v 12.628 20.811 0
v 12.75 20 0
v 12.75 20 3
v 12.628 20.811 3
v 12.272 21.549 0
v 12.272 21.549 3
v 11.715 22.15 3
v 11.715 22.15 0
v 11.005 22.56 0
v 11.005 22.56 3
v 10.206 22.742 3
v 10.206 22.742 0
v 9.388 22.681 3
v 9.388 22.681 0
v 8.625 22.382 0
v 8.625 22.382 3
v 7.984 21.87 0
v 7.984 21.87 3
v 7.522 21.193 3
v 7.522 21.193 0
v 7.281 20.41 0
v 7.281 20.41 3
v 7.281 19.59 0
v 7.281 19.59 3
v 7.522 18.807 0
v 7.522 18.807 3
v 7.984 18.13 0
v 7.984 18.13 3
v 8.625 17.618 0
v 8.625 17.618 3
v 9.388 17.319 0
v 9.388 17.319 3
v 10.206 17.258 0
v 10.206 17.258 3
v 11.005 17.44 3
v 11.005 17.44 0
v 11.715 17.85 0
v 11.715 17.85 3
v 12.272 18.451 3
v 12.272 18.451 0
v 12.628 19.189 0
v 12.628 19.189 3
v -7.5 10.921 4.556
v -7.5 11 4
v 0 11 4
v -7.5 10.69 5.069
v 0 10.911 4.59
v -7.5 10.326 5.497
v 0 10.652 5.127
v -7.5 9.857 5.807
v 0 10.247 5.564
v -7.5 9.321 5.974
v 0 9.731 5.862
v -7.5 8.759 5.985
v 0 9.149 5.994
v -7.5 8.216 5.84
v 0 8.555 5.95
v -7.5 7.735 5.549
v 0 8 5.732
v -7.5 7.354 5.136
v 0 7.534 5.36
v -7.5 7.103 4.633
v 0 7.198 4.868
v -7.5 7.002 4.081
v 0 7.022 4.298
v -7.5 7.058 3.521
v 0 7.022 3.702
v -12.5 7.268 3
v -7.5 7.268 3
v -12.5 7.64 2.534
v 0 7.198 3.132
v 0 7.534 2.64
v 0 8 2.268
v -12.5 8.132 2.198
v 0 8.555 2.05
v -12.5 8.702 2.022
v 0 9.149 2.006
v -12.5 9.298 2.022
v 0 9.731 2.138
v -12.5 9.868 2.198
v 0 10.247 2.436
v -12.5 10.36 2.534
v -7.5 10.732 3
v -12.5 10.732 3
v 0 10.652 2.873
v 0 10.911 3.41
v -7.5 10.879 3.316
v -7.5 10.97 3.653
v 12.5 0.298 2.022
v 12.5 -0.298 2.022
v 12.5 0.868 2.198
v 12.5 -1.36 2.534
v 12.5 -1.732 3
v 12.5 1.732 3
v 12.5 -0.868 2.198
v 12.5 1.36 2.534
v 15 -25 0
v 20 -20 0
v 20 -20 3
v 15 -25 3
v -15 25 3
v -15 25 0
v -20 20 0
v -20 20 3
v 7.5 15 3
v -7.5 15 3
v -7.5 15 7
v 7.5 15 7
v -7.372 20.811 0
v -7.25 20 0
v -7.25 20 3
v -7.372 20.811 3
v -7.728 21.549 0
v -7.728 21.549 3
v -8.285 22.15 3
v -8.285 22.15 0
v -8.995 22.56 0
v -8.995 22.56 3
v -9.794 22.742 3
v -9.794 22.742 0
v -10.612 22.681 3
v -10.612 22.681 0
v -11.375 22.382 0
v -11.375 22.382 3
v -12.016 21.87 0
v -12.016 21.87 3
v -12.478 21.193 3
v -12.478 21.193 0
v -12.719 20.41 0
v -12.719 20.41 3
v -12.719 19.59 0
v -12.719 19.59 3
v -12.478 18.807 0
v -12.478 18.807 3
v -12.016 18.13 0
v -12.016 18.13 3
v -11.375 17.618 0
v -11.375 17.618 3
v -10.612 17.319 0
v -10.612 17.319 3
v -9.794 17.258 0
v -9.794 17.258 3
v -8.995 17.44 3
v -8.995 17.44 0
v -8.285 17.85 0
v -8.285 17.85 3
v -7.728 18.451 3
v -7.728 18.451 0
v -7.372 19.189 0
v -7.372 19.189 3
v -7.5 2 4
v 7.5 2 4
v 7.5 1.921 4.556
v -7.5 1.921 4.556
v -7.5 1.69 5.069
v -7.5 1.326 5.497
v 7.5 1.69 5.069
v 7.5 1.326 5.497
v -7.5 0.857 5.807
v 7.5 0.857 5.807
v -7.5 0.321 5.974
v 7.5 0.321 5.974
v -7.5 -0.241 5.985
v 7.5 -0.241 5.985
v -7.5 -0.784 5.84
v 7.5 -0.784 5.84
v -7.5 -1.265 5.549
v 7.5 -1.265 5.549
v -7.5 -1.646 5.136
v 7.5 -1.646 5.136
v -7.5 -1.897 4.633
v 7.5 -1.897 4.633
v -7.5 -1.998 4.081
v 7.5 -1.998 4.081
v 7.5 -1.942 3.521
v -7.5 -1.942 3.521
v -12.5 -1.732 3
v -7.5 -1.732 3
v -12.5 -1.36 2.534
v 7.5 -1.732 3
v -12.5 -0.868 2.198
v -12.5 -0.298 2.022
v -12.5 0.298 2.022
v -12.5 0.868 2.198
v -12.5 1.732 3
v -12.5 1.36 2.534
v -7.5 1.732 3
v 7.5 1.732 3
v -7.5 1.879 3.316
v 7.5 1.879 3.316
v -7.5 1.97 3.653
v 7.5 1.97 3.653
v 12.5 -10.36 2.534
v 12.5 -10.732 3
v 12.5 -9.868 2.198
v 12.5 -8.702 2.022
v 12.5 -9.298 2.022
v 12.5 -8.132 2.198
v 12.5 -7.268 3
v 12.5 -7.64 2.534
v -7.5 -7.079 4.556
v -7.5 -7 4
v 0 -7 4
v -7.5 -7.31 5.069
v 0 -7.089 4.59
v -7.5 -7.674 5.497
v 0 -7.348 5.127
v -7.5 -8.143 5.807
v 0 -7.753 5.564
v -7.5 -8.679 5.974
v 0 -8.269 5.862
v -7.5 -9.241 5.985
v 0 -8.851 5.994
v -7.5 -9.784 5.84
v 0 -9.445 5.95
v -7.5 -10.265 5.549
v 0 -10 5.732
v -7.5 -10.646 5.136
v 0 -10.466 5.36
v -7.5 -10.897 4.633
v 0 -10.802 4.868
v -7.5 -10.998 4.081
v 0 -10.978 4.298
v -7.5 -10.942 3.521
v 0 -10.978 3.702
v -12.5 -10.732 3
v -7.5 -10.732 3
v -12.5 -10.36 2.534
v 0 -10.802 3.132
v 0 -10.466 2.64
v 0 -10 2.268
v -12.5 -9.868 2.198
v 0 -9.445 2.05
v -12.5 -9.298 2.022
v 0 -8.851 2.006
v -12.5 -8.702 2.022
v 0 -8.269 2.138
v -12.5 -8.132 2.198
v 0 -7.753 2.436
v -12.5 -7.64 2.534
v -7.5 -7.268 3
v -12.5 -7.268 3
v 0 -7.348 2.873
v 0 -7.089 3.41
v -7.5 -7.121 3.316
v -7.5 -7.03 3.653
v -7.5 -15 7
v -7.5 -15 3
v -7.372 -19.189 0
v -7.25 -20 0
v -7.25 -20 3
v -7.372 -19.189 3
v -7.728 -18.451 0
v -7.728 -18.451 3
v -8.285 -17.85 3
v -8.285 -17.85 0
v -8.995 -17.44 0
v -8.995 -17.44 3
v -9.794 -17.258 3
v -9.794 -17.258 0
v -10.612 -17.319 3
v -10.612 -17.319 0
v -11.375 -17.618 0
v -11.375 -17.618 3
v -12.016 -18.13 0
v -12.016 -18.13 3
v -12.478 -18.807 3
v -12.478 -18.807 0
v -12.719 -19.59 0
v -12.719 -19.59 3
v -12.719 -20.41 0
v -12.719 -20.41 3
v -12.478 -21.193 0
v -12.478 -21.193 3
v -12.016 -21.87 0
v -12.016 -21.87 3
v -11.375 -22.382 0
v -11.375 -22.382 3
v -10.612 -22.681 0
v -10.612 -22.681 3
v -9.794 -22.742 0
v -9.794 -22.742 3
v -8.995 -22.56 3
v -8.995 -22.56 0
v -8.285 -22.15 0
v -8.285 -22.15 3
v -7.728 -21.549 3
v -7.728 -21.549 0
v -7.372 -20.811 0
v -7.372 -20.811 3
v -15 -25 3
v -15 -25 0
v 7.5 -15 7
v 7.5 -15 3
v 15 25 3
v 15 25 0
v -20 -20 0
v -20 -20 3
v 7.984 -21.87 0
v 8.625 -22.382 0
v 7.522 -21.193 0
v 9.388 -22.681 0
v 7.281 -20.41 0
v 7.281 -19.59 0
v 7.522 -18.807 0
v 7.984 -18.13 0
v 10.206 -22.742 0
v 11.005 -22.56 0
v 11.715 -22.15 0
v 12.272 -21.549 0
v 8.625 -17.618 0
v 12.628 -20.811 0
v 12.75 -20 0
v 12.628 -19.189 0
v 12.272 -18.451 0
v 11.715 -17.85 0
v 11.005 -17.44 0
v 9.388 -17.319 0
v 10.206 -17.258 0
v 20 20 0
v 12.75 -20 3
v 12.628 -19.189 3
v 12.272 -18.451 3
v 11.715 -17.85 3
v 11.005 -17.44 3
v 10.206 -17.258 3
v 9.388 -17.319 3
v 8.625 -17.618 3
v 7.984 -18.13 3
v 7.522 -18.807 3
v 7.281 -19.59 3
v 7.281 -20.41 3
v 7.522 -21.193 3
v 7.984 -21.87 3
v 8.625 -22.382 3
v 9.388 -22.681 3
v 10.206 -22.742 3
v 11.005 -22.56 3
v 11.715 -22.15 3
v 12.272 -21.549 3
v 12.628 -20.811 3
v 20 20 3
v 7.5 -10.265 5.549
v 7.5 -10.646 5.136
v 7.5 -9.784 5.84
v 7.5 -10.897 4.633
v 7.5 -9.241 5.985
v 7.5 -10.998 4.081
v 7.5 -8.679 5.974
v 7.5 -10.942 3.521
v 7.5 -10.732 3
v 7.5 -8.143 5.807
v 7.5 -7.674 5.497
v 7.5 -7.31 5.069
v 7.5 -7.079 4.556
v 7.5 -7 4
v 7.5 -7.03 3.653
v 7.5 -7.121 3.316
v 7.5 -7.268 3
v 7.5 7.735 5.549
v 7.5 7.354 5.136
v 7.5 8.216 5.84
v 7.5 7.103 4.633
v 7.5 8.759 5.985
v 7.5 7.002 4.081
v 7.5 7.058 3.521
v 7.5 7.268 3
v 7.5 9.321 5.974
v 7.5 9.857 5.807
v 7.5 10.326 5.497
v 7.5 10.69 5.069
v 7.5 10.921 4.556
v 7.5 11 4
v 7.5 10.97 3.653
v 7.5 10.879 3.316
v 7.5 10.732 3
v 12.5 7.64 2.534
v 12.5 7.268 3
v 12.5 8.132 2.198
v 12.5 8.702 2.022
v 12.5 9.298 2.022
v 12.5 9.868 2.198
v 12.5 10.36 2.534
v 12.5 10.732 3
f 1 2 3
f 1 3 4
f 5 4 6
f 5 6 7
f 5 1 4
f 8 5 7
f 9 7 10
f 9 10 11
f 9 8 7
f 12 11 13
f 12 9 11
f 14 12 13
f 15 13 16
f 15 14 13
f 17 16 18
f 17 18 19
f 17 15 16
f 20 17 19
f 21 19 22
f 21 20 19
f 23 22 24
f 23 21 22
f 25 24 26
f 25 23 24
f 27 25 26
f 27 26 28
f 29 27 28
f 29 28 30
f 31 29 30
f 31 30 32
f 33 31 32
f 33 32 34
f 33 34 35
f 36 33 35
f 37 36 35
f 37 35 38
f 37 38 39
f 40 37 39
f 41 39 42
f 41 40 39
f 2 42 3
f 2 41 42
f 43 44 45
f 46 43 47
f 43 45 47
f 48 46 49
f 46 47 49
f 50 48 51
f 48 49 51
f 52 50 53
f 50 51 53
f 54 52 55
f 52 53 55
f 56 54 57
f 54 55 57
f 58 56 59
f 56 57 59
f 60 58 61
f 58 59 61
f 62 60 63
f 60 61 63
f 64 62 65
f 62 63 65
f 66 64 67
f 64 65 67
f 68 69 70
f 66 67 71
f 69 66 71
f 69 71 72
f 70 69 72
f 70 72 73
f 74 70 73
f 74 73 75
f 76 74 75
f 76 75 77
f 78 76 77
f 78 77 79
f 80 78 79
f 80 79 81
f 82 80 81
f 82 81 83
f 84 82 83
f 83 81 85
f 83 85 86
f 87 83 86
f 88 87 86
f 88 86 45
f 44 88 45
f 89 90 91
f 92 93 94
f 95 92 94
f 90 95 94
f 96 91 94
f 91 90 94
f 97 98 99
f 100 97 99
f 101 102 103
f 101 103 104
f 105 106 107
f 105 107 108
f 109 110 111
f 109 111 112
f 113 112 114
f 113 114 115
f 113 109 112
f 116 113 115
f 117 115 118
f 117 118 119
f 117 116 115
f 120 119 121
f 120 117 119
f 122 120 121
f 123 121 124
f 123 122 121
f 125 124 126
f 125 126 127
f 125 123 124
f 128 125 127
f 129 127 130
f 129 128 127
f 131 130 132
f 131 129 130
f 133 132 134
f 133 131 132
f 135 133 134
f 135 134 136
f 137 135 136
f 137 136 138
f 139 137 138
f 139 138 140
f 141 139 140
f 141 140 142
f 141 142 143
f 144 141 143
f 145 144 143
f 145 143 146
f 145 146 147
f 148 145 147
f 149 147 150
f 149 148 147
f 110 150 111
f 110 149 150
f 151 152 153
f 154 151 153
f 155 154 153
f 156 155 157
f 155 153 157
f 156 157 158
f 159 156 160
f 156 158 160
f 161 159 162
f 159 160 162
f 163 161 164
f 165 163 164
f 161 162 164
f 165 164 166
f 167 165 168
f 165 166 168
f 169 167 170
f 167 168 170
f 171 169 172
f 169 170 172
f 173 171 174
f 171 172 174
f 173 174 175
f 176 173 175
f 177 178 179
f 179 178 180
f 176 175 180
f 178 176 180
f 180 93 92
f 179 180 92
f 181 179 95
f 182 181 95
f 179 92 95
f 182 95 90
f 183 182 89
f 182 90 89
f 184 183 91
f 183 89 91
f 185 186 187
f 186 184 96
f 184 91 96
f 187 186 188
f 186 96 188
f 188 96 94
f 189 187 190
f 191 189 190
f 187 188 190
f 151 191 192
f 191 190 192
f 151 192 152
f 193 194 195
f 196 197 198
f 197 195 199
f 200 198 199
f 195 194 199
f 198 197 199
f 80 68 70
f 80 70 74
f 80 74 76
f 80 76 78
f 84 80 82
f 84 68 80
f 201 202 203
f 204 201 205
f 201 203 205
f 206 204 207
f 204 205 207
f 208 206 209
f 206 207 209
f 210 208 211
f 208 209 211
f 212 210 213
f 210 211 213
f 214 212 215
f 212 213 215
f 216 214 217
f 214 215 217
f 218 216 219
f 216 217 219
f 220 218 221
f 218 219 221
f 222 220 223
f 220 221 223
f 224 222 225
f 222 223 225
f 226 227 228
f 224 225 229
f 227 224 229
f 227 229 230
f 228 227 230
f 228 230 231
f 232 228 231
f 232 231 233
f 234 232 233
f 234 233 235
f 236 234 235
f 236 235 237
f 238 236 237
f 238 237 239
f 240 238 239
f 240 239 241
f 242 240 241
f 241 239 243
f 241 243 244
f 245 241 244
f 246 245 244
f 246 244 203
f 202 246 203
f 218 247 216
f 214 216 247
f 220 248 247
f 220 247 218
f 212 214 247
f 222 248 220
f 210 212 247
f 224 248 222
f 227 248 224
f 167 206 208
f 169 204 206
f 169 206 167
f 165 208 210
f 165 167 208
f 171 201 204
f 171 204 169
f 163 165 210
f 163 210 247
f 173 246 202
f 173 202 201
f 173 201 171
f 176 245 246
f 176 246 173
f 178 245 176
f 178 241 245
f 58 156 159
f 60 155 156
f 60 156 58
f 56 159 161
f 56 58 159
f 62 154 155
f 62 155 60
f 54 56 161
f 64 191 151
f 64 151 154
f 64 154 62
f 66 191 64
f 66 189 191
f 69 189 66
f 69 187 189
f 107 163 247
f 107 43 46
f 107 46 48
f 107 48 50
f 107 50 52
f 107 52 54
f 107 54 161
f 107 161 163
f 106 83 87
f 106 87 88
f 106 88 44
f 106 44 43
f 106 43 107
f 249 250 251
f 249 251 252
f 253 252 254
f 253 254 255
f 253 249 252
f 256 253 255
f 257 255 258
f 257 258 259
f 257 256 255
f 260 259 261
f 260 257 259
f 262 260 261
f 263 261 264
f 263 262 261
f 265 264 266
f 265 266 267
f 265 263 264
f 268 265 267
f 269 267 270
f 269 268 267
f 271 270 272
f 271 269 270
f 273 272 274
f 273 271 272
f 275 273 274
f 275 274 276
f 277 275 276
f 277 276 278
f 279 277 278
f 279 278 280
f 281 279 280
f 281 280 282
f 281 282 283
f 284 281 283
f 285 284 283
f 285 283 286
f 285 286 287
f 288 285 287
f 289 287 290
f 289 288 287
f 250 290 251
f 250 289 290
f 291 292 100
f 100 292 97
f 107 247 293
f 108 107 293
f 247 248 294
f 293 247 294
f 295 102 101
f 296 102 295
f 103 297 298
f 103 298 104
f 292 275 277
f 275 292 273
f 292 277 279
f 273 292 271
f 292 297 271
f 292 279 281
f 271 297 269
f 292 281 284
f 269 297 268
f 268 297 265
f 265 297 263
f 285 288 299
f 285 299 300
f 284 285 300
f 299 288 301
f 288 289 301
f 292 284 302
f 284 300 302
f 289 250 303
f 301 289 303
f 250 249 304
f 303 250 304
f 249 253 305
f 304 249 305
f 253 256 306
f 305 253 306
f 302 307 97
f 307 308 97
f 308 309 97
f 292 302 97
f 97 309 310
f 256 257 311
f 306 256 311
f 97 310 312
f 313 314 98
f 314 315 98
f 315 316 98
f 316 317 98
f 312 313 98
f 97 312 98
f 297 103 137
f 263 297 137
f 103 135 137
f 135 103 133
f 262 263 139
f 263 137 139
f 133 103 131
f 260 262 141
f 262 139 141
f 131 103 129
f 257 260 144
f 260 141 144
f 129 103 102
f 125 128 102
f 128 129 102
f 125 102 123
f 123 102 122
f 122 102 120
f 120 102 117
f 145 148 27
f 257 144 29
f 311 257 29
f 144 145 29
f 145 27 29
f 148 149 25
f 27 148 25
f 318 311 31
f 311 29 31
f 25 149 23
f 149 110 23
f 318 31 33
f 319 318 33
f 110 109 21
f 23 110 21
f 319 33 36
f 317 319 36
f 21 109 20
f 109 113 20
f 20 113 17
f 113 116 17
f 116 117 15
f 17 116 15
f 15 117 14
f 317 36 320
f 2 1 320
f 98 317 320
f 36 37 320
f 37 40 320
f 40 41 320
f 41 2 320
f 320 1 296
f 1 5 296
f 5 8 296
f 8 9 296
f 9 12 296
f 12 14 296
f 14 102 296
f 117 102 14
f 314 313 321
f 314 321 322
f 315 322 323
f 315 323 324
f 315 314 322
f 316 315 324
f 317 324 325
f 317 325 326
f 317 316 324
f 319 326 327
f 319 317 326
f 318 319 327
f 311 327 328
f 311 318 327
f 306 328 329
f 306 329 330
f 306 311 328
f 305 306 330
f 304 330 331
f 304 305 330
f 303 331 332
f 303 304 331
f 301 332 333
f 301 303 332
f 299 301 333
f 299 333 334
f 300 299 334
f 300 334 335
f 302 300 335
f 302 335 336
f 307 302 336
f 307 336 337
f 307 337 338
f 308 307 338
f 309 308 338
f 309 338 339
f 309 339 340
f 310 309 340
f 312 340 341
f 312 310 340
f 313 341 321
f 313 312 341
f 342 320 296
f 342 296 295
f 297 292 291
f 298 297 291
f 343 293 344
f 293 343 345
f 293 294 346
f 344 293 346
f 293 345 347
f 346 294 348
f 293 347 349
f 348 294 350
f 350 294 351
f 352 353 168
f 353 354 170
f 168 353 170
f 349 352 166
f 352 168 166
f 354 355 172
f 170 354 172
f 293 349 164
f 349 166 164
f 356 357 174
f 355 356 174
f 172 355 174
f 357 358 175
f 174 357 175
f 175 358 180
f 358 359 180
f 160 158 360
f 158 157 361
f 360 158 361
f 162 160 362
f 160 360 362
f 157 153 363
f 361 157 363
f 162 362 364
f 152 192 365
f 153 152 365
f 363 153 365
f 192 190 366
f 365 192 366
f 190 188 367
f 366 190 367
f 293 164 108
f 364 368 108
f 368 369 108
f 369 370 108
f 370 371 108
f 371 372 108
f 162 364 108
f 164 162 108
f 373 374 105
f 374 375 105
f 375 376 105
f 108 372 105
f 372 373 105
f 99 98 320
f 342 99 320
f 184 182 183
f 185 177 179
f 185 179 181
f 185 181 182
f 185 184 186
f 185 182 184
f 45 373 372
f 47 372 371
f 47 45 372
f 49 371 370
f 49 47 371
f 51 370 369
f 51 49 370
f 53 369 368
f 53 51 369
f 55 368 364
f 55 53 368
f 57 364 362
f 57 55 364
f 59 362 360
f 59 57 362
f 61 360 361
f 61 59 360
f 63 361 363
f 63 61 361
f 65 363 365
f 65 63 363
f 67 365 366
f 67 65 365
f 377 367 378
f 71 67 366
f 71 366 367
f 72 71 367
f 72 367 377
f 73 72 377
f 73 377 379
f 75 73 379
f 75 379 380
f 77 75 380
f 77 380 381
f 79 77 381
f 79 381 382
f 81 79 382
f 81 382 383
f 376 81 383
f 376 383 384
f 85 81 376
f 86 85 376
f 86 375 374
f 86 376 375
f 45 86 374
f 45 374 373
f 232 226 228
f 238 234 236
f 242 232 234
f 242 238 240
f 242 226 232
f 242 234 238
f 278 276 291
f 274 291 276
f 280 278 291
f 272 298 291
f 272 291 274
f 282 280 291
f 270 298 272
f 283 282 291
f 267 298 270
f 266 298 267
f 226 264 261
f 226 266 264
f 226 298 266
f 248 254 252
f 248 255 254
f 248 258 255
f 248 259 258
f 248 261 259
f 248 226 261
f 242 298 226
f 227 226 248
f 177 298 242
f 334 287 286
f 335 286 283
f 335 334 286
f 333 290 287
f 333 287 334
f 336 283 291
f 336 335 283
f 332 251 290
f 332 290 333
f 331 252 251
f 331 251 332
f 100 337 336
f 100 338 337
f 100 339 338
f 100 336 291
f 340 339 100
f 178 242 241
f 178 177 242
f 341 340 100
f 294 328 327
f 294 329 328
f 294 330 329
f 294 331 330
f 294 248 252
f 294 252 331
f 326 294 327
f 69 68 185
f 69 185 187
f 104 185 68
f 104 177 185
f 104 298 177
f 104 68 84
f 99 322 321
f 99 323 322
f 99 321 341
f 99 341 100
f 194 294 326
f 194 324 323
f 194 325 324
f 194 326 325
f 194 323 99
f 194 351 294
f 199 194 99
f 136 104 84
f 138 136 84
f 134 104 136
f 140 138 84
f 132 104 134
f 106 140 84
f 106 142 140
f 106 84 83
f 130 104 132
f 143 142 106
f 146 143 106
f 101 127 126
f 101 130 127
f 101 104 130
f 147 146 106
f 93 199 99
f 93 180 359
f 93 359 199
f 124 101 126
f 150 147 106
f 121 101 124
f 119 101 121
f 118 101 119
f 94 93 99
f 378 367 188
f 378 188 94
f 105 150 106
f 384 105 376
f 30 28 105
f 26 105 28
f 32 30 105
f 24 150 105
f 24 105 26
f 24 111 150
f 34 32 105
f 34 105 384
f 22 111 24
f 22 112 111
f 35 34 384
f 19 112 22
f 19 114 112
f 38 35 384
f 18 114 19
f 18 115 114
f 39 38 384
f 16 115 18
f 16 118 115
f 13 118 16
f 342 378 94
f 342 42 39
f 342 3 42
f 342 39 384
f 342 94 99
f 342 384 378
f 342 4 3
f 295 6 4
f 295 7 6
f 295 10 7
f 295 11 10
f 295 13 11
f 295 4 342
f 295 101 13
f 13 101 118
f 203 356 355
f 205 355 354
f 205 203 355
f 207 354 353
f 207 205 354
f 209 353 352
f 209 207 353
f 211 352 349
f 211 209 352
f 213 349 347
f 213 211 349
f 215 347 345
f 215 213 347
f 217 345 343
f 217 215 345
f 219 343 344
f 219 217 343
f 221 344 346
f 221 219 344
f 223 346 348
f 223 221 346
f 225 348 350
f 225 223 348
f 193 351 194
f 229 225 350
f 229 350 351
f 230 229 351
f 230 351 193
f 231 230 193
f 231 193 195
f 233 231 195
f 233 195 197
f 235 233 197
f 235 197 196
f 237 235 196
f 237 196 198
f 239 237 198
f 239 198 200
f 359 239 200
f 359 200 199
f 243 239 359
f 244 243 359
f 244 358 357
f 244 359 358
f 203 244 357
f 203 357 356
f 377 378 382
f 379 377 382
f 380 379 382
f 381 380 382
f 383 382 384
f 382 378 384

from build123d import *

# Parameters (mm, degrees)
F0_W     = 40
F0_H     = 50
F0_R     = 2.75
F1_DEPTH = 3
F2_SIZE  = 5
F3_W     = 15
F3_H     = 30
F4_DEPTH = 4
F6_DEPTH = 12.5


with BuildPart() as f1:
    # F0 (on Top) → F1 (new body)
    with BuildSketch(Plane.XY):
        Rectangle(F0_W, F0_H)
        with Locations((-10, -20)):
            Circle(F0_R, mode=Mode.SUBTRACT)
        with Locations((10, -20)):
            Circle(F0_R, mode=Mode.SUBTRACT)
        with Locations((-10, 20)):
            Circle(F0_R, mode=Mode.SUBTRACT)
        with Locations((10, 20)):
            Circle(F0_R, mode=Mode.SUBTRACT)
    extrude(amount=F1_DEPTH)

    # F2
    f2_edges = [f1.edges().sort_by_distance(p)[0] for p in [
        (-20, 25, 1.5),
        (20, 25, 1.5),
        (-20, -25, 1.5),
        (20, -25, 1.5),
    ]]
    chamfer(f2_edges, length=F2_SIZE)

    # F3 (on face) → F4 (join)
    with BuildSketch(Plane.XY.offset(3)):
        Rectangle(F3_W, F3_H)
    extrude(amount=F4_DEPTH)

    # F5 (on Right) → F6 (cut, symmetric)
    with BuildSketch(Plane.YZ):
        with BuildLine():
            ThreePointArc((7, 4), (9, 2), (11, 4))
            Line((11, 4), (7, 4))
        make_face()
        with BuildLine():
            Line((7, 4), (11, 4))
            ThreePointArc((11, 4), (9, 6), (7, 4))
        make_face()
        with BuildLine():
            ThreePointArc((-11, 4), (-9, 2), (-7, 4))
            Line((-7, 4), (-11, 4))
        make_face()
        with BuildLine():
            Line((-11, 4), (-7, 4))
            ThreePointArc((-7, 4), (-9, 6), (-11, 4))
        make_face()
        with BuildLine():
            ThreePointArc((-2, 4), (0, 2), (2, 4))
            Line((2, 4), (-2, 4))
        make_face()
        with BuildLine():
            Line((-2, 4), (2, 4))
            ThreePointArc((2, 4), (0, 6), (-2, 4))
        make_face()
    extrude(amount=F6_DEPTH, both=True, mode=Mode.SUBTRACT)


solid = f1.part
